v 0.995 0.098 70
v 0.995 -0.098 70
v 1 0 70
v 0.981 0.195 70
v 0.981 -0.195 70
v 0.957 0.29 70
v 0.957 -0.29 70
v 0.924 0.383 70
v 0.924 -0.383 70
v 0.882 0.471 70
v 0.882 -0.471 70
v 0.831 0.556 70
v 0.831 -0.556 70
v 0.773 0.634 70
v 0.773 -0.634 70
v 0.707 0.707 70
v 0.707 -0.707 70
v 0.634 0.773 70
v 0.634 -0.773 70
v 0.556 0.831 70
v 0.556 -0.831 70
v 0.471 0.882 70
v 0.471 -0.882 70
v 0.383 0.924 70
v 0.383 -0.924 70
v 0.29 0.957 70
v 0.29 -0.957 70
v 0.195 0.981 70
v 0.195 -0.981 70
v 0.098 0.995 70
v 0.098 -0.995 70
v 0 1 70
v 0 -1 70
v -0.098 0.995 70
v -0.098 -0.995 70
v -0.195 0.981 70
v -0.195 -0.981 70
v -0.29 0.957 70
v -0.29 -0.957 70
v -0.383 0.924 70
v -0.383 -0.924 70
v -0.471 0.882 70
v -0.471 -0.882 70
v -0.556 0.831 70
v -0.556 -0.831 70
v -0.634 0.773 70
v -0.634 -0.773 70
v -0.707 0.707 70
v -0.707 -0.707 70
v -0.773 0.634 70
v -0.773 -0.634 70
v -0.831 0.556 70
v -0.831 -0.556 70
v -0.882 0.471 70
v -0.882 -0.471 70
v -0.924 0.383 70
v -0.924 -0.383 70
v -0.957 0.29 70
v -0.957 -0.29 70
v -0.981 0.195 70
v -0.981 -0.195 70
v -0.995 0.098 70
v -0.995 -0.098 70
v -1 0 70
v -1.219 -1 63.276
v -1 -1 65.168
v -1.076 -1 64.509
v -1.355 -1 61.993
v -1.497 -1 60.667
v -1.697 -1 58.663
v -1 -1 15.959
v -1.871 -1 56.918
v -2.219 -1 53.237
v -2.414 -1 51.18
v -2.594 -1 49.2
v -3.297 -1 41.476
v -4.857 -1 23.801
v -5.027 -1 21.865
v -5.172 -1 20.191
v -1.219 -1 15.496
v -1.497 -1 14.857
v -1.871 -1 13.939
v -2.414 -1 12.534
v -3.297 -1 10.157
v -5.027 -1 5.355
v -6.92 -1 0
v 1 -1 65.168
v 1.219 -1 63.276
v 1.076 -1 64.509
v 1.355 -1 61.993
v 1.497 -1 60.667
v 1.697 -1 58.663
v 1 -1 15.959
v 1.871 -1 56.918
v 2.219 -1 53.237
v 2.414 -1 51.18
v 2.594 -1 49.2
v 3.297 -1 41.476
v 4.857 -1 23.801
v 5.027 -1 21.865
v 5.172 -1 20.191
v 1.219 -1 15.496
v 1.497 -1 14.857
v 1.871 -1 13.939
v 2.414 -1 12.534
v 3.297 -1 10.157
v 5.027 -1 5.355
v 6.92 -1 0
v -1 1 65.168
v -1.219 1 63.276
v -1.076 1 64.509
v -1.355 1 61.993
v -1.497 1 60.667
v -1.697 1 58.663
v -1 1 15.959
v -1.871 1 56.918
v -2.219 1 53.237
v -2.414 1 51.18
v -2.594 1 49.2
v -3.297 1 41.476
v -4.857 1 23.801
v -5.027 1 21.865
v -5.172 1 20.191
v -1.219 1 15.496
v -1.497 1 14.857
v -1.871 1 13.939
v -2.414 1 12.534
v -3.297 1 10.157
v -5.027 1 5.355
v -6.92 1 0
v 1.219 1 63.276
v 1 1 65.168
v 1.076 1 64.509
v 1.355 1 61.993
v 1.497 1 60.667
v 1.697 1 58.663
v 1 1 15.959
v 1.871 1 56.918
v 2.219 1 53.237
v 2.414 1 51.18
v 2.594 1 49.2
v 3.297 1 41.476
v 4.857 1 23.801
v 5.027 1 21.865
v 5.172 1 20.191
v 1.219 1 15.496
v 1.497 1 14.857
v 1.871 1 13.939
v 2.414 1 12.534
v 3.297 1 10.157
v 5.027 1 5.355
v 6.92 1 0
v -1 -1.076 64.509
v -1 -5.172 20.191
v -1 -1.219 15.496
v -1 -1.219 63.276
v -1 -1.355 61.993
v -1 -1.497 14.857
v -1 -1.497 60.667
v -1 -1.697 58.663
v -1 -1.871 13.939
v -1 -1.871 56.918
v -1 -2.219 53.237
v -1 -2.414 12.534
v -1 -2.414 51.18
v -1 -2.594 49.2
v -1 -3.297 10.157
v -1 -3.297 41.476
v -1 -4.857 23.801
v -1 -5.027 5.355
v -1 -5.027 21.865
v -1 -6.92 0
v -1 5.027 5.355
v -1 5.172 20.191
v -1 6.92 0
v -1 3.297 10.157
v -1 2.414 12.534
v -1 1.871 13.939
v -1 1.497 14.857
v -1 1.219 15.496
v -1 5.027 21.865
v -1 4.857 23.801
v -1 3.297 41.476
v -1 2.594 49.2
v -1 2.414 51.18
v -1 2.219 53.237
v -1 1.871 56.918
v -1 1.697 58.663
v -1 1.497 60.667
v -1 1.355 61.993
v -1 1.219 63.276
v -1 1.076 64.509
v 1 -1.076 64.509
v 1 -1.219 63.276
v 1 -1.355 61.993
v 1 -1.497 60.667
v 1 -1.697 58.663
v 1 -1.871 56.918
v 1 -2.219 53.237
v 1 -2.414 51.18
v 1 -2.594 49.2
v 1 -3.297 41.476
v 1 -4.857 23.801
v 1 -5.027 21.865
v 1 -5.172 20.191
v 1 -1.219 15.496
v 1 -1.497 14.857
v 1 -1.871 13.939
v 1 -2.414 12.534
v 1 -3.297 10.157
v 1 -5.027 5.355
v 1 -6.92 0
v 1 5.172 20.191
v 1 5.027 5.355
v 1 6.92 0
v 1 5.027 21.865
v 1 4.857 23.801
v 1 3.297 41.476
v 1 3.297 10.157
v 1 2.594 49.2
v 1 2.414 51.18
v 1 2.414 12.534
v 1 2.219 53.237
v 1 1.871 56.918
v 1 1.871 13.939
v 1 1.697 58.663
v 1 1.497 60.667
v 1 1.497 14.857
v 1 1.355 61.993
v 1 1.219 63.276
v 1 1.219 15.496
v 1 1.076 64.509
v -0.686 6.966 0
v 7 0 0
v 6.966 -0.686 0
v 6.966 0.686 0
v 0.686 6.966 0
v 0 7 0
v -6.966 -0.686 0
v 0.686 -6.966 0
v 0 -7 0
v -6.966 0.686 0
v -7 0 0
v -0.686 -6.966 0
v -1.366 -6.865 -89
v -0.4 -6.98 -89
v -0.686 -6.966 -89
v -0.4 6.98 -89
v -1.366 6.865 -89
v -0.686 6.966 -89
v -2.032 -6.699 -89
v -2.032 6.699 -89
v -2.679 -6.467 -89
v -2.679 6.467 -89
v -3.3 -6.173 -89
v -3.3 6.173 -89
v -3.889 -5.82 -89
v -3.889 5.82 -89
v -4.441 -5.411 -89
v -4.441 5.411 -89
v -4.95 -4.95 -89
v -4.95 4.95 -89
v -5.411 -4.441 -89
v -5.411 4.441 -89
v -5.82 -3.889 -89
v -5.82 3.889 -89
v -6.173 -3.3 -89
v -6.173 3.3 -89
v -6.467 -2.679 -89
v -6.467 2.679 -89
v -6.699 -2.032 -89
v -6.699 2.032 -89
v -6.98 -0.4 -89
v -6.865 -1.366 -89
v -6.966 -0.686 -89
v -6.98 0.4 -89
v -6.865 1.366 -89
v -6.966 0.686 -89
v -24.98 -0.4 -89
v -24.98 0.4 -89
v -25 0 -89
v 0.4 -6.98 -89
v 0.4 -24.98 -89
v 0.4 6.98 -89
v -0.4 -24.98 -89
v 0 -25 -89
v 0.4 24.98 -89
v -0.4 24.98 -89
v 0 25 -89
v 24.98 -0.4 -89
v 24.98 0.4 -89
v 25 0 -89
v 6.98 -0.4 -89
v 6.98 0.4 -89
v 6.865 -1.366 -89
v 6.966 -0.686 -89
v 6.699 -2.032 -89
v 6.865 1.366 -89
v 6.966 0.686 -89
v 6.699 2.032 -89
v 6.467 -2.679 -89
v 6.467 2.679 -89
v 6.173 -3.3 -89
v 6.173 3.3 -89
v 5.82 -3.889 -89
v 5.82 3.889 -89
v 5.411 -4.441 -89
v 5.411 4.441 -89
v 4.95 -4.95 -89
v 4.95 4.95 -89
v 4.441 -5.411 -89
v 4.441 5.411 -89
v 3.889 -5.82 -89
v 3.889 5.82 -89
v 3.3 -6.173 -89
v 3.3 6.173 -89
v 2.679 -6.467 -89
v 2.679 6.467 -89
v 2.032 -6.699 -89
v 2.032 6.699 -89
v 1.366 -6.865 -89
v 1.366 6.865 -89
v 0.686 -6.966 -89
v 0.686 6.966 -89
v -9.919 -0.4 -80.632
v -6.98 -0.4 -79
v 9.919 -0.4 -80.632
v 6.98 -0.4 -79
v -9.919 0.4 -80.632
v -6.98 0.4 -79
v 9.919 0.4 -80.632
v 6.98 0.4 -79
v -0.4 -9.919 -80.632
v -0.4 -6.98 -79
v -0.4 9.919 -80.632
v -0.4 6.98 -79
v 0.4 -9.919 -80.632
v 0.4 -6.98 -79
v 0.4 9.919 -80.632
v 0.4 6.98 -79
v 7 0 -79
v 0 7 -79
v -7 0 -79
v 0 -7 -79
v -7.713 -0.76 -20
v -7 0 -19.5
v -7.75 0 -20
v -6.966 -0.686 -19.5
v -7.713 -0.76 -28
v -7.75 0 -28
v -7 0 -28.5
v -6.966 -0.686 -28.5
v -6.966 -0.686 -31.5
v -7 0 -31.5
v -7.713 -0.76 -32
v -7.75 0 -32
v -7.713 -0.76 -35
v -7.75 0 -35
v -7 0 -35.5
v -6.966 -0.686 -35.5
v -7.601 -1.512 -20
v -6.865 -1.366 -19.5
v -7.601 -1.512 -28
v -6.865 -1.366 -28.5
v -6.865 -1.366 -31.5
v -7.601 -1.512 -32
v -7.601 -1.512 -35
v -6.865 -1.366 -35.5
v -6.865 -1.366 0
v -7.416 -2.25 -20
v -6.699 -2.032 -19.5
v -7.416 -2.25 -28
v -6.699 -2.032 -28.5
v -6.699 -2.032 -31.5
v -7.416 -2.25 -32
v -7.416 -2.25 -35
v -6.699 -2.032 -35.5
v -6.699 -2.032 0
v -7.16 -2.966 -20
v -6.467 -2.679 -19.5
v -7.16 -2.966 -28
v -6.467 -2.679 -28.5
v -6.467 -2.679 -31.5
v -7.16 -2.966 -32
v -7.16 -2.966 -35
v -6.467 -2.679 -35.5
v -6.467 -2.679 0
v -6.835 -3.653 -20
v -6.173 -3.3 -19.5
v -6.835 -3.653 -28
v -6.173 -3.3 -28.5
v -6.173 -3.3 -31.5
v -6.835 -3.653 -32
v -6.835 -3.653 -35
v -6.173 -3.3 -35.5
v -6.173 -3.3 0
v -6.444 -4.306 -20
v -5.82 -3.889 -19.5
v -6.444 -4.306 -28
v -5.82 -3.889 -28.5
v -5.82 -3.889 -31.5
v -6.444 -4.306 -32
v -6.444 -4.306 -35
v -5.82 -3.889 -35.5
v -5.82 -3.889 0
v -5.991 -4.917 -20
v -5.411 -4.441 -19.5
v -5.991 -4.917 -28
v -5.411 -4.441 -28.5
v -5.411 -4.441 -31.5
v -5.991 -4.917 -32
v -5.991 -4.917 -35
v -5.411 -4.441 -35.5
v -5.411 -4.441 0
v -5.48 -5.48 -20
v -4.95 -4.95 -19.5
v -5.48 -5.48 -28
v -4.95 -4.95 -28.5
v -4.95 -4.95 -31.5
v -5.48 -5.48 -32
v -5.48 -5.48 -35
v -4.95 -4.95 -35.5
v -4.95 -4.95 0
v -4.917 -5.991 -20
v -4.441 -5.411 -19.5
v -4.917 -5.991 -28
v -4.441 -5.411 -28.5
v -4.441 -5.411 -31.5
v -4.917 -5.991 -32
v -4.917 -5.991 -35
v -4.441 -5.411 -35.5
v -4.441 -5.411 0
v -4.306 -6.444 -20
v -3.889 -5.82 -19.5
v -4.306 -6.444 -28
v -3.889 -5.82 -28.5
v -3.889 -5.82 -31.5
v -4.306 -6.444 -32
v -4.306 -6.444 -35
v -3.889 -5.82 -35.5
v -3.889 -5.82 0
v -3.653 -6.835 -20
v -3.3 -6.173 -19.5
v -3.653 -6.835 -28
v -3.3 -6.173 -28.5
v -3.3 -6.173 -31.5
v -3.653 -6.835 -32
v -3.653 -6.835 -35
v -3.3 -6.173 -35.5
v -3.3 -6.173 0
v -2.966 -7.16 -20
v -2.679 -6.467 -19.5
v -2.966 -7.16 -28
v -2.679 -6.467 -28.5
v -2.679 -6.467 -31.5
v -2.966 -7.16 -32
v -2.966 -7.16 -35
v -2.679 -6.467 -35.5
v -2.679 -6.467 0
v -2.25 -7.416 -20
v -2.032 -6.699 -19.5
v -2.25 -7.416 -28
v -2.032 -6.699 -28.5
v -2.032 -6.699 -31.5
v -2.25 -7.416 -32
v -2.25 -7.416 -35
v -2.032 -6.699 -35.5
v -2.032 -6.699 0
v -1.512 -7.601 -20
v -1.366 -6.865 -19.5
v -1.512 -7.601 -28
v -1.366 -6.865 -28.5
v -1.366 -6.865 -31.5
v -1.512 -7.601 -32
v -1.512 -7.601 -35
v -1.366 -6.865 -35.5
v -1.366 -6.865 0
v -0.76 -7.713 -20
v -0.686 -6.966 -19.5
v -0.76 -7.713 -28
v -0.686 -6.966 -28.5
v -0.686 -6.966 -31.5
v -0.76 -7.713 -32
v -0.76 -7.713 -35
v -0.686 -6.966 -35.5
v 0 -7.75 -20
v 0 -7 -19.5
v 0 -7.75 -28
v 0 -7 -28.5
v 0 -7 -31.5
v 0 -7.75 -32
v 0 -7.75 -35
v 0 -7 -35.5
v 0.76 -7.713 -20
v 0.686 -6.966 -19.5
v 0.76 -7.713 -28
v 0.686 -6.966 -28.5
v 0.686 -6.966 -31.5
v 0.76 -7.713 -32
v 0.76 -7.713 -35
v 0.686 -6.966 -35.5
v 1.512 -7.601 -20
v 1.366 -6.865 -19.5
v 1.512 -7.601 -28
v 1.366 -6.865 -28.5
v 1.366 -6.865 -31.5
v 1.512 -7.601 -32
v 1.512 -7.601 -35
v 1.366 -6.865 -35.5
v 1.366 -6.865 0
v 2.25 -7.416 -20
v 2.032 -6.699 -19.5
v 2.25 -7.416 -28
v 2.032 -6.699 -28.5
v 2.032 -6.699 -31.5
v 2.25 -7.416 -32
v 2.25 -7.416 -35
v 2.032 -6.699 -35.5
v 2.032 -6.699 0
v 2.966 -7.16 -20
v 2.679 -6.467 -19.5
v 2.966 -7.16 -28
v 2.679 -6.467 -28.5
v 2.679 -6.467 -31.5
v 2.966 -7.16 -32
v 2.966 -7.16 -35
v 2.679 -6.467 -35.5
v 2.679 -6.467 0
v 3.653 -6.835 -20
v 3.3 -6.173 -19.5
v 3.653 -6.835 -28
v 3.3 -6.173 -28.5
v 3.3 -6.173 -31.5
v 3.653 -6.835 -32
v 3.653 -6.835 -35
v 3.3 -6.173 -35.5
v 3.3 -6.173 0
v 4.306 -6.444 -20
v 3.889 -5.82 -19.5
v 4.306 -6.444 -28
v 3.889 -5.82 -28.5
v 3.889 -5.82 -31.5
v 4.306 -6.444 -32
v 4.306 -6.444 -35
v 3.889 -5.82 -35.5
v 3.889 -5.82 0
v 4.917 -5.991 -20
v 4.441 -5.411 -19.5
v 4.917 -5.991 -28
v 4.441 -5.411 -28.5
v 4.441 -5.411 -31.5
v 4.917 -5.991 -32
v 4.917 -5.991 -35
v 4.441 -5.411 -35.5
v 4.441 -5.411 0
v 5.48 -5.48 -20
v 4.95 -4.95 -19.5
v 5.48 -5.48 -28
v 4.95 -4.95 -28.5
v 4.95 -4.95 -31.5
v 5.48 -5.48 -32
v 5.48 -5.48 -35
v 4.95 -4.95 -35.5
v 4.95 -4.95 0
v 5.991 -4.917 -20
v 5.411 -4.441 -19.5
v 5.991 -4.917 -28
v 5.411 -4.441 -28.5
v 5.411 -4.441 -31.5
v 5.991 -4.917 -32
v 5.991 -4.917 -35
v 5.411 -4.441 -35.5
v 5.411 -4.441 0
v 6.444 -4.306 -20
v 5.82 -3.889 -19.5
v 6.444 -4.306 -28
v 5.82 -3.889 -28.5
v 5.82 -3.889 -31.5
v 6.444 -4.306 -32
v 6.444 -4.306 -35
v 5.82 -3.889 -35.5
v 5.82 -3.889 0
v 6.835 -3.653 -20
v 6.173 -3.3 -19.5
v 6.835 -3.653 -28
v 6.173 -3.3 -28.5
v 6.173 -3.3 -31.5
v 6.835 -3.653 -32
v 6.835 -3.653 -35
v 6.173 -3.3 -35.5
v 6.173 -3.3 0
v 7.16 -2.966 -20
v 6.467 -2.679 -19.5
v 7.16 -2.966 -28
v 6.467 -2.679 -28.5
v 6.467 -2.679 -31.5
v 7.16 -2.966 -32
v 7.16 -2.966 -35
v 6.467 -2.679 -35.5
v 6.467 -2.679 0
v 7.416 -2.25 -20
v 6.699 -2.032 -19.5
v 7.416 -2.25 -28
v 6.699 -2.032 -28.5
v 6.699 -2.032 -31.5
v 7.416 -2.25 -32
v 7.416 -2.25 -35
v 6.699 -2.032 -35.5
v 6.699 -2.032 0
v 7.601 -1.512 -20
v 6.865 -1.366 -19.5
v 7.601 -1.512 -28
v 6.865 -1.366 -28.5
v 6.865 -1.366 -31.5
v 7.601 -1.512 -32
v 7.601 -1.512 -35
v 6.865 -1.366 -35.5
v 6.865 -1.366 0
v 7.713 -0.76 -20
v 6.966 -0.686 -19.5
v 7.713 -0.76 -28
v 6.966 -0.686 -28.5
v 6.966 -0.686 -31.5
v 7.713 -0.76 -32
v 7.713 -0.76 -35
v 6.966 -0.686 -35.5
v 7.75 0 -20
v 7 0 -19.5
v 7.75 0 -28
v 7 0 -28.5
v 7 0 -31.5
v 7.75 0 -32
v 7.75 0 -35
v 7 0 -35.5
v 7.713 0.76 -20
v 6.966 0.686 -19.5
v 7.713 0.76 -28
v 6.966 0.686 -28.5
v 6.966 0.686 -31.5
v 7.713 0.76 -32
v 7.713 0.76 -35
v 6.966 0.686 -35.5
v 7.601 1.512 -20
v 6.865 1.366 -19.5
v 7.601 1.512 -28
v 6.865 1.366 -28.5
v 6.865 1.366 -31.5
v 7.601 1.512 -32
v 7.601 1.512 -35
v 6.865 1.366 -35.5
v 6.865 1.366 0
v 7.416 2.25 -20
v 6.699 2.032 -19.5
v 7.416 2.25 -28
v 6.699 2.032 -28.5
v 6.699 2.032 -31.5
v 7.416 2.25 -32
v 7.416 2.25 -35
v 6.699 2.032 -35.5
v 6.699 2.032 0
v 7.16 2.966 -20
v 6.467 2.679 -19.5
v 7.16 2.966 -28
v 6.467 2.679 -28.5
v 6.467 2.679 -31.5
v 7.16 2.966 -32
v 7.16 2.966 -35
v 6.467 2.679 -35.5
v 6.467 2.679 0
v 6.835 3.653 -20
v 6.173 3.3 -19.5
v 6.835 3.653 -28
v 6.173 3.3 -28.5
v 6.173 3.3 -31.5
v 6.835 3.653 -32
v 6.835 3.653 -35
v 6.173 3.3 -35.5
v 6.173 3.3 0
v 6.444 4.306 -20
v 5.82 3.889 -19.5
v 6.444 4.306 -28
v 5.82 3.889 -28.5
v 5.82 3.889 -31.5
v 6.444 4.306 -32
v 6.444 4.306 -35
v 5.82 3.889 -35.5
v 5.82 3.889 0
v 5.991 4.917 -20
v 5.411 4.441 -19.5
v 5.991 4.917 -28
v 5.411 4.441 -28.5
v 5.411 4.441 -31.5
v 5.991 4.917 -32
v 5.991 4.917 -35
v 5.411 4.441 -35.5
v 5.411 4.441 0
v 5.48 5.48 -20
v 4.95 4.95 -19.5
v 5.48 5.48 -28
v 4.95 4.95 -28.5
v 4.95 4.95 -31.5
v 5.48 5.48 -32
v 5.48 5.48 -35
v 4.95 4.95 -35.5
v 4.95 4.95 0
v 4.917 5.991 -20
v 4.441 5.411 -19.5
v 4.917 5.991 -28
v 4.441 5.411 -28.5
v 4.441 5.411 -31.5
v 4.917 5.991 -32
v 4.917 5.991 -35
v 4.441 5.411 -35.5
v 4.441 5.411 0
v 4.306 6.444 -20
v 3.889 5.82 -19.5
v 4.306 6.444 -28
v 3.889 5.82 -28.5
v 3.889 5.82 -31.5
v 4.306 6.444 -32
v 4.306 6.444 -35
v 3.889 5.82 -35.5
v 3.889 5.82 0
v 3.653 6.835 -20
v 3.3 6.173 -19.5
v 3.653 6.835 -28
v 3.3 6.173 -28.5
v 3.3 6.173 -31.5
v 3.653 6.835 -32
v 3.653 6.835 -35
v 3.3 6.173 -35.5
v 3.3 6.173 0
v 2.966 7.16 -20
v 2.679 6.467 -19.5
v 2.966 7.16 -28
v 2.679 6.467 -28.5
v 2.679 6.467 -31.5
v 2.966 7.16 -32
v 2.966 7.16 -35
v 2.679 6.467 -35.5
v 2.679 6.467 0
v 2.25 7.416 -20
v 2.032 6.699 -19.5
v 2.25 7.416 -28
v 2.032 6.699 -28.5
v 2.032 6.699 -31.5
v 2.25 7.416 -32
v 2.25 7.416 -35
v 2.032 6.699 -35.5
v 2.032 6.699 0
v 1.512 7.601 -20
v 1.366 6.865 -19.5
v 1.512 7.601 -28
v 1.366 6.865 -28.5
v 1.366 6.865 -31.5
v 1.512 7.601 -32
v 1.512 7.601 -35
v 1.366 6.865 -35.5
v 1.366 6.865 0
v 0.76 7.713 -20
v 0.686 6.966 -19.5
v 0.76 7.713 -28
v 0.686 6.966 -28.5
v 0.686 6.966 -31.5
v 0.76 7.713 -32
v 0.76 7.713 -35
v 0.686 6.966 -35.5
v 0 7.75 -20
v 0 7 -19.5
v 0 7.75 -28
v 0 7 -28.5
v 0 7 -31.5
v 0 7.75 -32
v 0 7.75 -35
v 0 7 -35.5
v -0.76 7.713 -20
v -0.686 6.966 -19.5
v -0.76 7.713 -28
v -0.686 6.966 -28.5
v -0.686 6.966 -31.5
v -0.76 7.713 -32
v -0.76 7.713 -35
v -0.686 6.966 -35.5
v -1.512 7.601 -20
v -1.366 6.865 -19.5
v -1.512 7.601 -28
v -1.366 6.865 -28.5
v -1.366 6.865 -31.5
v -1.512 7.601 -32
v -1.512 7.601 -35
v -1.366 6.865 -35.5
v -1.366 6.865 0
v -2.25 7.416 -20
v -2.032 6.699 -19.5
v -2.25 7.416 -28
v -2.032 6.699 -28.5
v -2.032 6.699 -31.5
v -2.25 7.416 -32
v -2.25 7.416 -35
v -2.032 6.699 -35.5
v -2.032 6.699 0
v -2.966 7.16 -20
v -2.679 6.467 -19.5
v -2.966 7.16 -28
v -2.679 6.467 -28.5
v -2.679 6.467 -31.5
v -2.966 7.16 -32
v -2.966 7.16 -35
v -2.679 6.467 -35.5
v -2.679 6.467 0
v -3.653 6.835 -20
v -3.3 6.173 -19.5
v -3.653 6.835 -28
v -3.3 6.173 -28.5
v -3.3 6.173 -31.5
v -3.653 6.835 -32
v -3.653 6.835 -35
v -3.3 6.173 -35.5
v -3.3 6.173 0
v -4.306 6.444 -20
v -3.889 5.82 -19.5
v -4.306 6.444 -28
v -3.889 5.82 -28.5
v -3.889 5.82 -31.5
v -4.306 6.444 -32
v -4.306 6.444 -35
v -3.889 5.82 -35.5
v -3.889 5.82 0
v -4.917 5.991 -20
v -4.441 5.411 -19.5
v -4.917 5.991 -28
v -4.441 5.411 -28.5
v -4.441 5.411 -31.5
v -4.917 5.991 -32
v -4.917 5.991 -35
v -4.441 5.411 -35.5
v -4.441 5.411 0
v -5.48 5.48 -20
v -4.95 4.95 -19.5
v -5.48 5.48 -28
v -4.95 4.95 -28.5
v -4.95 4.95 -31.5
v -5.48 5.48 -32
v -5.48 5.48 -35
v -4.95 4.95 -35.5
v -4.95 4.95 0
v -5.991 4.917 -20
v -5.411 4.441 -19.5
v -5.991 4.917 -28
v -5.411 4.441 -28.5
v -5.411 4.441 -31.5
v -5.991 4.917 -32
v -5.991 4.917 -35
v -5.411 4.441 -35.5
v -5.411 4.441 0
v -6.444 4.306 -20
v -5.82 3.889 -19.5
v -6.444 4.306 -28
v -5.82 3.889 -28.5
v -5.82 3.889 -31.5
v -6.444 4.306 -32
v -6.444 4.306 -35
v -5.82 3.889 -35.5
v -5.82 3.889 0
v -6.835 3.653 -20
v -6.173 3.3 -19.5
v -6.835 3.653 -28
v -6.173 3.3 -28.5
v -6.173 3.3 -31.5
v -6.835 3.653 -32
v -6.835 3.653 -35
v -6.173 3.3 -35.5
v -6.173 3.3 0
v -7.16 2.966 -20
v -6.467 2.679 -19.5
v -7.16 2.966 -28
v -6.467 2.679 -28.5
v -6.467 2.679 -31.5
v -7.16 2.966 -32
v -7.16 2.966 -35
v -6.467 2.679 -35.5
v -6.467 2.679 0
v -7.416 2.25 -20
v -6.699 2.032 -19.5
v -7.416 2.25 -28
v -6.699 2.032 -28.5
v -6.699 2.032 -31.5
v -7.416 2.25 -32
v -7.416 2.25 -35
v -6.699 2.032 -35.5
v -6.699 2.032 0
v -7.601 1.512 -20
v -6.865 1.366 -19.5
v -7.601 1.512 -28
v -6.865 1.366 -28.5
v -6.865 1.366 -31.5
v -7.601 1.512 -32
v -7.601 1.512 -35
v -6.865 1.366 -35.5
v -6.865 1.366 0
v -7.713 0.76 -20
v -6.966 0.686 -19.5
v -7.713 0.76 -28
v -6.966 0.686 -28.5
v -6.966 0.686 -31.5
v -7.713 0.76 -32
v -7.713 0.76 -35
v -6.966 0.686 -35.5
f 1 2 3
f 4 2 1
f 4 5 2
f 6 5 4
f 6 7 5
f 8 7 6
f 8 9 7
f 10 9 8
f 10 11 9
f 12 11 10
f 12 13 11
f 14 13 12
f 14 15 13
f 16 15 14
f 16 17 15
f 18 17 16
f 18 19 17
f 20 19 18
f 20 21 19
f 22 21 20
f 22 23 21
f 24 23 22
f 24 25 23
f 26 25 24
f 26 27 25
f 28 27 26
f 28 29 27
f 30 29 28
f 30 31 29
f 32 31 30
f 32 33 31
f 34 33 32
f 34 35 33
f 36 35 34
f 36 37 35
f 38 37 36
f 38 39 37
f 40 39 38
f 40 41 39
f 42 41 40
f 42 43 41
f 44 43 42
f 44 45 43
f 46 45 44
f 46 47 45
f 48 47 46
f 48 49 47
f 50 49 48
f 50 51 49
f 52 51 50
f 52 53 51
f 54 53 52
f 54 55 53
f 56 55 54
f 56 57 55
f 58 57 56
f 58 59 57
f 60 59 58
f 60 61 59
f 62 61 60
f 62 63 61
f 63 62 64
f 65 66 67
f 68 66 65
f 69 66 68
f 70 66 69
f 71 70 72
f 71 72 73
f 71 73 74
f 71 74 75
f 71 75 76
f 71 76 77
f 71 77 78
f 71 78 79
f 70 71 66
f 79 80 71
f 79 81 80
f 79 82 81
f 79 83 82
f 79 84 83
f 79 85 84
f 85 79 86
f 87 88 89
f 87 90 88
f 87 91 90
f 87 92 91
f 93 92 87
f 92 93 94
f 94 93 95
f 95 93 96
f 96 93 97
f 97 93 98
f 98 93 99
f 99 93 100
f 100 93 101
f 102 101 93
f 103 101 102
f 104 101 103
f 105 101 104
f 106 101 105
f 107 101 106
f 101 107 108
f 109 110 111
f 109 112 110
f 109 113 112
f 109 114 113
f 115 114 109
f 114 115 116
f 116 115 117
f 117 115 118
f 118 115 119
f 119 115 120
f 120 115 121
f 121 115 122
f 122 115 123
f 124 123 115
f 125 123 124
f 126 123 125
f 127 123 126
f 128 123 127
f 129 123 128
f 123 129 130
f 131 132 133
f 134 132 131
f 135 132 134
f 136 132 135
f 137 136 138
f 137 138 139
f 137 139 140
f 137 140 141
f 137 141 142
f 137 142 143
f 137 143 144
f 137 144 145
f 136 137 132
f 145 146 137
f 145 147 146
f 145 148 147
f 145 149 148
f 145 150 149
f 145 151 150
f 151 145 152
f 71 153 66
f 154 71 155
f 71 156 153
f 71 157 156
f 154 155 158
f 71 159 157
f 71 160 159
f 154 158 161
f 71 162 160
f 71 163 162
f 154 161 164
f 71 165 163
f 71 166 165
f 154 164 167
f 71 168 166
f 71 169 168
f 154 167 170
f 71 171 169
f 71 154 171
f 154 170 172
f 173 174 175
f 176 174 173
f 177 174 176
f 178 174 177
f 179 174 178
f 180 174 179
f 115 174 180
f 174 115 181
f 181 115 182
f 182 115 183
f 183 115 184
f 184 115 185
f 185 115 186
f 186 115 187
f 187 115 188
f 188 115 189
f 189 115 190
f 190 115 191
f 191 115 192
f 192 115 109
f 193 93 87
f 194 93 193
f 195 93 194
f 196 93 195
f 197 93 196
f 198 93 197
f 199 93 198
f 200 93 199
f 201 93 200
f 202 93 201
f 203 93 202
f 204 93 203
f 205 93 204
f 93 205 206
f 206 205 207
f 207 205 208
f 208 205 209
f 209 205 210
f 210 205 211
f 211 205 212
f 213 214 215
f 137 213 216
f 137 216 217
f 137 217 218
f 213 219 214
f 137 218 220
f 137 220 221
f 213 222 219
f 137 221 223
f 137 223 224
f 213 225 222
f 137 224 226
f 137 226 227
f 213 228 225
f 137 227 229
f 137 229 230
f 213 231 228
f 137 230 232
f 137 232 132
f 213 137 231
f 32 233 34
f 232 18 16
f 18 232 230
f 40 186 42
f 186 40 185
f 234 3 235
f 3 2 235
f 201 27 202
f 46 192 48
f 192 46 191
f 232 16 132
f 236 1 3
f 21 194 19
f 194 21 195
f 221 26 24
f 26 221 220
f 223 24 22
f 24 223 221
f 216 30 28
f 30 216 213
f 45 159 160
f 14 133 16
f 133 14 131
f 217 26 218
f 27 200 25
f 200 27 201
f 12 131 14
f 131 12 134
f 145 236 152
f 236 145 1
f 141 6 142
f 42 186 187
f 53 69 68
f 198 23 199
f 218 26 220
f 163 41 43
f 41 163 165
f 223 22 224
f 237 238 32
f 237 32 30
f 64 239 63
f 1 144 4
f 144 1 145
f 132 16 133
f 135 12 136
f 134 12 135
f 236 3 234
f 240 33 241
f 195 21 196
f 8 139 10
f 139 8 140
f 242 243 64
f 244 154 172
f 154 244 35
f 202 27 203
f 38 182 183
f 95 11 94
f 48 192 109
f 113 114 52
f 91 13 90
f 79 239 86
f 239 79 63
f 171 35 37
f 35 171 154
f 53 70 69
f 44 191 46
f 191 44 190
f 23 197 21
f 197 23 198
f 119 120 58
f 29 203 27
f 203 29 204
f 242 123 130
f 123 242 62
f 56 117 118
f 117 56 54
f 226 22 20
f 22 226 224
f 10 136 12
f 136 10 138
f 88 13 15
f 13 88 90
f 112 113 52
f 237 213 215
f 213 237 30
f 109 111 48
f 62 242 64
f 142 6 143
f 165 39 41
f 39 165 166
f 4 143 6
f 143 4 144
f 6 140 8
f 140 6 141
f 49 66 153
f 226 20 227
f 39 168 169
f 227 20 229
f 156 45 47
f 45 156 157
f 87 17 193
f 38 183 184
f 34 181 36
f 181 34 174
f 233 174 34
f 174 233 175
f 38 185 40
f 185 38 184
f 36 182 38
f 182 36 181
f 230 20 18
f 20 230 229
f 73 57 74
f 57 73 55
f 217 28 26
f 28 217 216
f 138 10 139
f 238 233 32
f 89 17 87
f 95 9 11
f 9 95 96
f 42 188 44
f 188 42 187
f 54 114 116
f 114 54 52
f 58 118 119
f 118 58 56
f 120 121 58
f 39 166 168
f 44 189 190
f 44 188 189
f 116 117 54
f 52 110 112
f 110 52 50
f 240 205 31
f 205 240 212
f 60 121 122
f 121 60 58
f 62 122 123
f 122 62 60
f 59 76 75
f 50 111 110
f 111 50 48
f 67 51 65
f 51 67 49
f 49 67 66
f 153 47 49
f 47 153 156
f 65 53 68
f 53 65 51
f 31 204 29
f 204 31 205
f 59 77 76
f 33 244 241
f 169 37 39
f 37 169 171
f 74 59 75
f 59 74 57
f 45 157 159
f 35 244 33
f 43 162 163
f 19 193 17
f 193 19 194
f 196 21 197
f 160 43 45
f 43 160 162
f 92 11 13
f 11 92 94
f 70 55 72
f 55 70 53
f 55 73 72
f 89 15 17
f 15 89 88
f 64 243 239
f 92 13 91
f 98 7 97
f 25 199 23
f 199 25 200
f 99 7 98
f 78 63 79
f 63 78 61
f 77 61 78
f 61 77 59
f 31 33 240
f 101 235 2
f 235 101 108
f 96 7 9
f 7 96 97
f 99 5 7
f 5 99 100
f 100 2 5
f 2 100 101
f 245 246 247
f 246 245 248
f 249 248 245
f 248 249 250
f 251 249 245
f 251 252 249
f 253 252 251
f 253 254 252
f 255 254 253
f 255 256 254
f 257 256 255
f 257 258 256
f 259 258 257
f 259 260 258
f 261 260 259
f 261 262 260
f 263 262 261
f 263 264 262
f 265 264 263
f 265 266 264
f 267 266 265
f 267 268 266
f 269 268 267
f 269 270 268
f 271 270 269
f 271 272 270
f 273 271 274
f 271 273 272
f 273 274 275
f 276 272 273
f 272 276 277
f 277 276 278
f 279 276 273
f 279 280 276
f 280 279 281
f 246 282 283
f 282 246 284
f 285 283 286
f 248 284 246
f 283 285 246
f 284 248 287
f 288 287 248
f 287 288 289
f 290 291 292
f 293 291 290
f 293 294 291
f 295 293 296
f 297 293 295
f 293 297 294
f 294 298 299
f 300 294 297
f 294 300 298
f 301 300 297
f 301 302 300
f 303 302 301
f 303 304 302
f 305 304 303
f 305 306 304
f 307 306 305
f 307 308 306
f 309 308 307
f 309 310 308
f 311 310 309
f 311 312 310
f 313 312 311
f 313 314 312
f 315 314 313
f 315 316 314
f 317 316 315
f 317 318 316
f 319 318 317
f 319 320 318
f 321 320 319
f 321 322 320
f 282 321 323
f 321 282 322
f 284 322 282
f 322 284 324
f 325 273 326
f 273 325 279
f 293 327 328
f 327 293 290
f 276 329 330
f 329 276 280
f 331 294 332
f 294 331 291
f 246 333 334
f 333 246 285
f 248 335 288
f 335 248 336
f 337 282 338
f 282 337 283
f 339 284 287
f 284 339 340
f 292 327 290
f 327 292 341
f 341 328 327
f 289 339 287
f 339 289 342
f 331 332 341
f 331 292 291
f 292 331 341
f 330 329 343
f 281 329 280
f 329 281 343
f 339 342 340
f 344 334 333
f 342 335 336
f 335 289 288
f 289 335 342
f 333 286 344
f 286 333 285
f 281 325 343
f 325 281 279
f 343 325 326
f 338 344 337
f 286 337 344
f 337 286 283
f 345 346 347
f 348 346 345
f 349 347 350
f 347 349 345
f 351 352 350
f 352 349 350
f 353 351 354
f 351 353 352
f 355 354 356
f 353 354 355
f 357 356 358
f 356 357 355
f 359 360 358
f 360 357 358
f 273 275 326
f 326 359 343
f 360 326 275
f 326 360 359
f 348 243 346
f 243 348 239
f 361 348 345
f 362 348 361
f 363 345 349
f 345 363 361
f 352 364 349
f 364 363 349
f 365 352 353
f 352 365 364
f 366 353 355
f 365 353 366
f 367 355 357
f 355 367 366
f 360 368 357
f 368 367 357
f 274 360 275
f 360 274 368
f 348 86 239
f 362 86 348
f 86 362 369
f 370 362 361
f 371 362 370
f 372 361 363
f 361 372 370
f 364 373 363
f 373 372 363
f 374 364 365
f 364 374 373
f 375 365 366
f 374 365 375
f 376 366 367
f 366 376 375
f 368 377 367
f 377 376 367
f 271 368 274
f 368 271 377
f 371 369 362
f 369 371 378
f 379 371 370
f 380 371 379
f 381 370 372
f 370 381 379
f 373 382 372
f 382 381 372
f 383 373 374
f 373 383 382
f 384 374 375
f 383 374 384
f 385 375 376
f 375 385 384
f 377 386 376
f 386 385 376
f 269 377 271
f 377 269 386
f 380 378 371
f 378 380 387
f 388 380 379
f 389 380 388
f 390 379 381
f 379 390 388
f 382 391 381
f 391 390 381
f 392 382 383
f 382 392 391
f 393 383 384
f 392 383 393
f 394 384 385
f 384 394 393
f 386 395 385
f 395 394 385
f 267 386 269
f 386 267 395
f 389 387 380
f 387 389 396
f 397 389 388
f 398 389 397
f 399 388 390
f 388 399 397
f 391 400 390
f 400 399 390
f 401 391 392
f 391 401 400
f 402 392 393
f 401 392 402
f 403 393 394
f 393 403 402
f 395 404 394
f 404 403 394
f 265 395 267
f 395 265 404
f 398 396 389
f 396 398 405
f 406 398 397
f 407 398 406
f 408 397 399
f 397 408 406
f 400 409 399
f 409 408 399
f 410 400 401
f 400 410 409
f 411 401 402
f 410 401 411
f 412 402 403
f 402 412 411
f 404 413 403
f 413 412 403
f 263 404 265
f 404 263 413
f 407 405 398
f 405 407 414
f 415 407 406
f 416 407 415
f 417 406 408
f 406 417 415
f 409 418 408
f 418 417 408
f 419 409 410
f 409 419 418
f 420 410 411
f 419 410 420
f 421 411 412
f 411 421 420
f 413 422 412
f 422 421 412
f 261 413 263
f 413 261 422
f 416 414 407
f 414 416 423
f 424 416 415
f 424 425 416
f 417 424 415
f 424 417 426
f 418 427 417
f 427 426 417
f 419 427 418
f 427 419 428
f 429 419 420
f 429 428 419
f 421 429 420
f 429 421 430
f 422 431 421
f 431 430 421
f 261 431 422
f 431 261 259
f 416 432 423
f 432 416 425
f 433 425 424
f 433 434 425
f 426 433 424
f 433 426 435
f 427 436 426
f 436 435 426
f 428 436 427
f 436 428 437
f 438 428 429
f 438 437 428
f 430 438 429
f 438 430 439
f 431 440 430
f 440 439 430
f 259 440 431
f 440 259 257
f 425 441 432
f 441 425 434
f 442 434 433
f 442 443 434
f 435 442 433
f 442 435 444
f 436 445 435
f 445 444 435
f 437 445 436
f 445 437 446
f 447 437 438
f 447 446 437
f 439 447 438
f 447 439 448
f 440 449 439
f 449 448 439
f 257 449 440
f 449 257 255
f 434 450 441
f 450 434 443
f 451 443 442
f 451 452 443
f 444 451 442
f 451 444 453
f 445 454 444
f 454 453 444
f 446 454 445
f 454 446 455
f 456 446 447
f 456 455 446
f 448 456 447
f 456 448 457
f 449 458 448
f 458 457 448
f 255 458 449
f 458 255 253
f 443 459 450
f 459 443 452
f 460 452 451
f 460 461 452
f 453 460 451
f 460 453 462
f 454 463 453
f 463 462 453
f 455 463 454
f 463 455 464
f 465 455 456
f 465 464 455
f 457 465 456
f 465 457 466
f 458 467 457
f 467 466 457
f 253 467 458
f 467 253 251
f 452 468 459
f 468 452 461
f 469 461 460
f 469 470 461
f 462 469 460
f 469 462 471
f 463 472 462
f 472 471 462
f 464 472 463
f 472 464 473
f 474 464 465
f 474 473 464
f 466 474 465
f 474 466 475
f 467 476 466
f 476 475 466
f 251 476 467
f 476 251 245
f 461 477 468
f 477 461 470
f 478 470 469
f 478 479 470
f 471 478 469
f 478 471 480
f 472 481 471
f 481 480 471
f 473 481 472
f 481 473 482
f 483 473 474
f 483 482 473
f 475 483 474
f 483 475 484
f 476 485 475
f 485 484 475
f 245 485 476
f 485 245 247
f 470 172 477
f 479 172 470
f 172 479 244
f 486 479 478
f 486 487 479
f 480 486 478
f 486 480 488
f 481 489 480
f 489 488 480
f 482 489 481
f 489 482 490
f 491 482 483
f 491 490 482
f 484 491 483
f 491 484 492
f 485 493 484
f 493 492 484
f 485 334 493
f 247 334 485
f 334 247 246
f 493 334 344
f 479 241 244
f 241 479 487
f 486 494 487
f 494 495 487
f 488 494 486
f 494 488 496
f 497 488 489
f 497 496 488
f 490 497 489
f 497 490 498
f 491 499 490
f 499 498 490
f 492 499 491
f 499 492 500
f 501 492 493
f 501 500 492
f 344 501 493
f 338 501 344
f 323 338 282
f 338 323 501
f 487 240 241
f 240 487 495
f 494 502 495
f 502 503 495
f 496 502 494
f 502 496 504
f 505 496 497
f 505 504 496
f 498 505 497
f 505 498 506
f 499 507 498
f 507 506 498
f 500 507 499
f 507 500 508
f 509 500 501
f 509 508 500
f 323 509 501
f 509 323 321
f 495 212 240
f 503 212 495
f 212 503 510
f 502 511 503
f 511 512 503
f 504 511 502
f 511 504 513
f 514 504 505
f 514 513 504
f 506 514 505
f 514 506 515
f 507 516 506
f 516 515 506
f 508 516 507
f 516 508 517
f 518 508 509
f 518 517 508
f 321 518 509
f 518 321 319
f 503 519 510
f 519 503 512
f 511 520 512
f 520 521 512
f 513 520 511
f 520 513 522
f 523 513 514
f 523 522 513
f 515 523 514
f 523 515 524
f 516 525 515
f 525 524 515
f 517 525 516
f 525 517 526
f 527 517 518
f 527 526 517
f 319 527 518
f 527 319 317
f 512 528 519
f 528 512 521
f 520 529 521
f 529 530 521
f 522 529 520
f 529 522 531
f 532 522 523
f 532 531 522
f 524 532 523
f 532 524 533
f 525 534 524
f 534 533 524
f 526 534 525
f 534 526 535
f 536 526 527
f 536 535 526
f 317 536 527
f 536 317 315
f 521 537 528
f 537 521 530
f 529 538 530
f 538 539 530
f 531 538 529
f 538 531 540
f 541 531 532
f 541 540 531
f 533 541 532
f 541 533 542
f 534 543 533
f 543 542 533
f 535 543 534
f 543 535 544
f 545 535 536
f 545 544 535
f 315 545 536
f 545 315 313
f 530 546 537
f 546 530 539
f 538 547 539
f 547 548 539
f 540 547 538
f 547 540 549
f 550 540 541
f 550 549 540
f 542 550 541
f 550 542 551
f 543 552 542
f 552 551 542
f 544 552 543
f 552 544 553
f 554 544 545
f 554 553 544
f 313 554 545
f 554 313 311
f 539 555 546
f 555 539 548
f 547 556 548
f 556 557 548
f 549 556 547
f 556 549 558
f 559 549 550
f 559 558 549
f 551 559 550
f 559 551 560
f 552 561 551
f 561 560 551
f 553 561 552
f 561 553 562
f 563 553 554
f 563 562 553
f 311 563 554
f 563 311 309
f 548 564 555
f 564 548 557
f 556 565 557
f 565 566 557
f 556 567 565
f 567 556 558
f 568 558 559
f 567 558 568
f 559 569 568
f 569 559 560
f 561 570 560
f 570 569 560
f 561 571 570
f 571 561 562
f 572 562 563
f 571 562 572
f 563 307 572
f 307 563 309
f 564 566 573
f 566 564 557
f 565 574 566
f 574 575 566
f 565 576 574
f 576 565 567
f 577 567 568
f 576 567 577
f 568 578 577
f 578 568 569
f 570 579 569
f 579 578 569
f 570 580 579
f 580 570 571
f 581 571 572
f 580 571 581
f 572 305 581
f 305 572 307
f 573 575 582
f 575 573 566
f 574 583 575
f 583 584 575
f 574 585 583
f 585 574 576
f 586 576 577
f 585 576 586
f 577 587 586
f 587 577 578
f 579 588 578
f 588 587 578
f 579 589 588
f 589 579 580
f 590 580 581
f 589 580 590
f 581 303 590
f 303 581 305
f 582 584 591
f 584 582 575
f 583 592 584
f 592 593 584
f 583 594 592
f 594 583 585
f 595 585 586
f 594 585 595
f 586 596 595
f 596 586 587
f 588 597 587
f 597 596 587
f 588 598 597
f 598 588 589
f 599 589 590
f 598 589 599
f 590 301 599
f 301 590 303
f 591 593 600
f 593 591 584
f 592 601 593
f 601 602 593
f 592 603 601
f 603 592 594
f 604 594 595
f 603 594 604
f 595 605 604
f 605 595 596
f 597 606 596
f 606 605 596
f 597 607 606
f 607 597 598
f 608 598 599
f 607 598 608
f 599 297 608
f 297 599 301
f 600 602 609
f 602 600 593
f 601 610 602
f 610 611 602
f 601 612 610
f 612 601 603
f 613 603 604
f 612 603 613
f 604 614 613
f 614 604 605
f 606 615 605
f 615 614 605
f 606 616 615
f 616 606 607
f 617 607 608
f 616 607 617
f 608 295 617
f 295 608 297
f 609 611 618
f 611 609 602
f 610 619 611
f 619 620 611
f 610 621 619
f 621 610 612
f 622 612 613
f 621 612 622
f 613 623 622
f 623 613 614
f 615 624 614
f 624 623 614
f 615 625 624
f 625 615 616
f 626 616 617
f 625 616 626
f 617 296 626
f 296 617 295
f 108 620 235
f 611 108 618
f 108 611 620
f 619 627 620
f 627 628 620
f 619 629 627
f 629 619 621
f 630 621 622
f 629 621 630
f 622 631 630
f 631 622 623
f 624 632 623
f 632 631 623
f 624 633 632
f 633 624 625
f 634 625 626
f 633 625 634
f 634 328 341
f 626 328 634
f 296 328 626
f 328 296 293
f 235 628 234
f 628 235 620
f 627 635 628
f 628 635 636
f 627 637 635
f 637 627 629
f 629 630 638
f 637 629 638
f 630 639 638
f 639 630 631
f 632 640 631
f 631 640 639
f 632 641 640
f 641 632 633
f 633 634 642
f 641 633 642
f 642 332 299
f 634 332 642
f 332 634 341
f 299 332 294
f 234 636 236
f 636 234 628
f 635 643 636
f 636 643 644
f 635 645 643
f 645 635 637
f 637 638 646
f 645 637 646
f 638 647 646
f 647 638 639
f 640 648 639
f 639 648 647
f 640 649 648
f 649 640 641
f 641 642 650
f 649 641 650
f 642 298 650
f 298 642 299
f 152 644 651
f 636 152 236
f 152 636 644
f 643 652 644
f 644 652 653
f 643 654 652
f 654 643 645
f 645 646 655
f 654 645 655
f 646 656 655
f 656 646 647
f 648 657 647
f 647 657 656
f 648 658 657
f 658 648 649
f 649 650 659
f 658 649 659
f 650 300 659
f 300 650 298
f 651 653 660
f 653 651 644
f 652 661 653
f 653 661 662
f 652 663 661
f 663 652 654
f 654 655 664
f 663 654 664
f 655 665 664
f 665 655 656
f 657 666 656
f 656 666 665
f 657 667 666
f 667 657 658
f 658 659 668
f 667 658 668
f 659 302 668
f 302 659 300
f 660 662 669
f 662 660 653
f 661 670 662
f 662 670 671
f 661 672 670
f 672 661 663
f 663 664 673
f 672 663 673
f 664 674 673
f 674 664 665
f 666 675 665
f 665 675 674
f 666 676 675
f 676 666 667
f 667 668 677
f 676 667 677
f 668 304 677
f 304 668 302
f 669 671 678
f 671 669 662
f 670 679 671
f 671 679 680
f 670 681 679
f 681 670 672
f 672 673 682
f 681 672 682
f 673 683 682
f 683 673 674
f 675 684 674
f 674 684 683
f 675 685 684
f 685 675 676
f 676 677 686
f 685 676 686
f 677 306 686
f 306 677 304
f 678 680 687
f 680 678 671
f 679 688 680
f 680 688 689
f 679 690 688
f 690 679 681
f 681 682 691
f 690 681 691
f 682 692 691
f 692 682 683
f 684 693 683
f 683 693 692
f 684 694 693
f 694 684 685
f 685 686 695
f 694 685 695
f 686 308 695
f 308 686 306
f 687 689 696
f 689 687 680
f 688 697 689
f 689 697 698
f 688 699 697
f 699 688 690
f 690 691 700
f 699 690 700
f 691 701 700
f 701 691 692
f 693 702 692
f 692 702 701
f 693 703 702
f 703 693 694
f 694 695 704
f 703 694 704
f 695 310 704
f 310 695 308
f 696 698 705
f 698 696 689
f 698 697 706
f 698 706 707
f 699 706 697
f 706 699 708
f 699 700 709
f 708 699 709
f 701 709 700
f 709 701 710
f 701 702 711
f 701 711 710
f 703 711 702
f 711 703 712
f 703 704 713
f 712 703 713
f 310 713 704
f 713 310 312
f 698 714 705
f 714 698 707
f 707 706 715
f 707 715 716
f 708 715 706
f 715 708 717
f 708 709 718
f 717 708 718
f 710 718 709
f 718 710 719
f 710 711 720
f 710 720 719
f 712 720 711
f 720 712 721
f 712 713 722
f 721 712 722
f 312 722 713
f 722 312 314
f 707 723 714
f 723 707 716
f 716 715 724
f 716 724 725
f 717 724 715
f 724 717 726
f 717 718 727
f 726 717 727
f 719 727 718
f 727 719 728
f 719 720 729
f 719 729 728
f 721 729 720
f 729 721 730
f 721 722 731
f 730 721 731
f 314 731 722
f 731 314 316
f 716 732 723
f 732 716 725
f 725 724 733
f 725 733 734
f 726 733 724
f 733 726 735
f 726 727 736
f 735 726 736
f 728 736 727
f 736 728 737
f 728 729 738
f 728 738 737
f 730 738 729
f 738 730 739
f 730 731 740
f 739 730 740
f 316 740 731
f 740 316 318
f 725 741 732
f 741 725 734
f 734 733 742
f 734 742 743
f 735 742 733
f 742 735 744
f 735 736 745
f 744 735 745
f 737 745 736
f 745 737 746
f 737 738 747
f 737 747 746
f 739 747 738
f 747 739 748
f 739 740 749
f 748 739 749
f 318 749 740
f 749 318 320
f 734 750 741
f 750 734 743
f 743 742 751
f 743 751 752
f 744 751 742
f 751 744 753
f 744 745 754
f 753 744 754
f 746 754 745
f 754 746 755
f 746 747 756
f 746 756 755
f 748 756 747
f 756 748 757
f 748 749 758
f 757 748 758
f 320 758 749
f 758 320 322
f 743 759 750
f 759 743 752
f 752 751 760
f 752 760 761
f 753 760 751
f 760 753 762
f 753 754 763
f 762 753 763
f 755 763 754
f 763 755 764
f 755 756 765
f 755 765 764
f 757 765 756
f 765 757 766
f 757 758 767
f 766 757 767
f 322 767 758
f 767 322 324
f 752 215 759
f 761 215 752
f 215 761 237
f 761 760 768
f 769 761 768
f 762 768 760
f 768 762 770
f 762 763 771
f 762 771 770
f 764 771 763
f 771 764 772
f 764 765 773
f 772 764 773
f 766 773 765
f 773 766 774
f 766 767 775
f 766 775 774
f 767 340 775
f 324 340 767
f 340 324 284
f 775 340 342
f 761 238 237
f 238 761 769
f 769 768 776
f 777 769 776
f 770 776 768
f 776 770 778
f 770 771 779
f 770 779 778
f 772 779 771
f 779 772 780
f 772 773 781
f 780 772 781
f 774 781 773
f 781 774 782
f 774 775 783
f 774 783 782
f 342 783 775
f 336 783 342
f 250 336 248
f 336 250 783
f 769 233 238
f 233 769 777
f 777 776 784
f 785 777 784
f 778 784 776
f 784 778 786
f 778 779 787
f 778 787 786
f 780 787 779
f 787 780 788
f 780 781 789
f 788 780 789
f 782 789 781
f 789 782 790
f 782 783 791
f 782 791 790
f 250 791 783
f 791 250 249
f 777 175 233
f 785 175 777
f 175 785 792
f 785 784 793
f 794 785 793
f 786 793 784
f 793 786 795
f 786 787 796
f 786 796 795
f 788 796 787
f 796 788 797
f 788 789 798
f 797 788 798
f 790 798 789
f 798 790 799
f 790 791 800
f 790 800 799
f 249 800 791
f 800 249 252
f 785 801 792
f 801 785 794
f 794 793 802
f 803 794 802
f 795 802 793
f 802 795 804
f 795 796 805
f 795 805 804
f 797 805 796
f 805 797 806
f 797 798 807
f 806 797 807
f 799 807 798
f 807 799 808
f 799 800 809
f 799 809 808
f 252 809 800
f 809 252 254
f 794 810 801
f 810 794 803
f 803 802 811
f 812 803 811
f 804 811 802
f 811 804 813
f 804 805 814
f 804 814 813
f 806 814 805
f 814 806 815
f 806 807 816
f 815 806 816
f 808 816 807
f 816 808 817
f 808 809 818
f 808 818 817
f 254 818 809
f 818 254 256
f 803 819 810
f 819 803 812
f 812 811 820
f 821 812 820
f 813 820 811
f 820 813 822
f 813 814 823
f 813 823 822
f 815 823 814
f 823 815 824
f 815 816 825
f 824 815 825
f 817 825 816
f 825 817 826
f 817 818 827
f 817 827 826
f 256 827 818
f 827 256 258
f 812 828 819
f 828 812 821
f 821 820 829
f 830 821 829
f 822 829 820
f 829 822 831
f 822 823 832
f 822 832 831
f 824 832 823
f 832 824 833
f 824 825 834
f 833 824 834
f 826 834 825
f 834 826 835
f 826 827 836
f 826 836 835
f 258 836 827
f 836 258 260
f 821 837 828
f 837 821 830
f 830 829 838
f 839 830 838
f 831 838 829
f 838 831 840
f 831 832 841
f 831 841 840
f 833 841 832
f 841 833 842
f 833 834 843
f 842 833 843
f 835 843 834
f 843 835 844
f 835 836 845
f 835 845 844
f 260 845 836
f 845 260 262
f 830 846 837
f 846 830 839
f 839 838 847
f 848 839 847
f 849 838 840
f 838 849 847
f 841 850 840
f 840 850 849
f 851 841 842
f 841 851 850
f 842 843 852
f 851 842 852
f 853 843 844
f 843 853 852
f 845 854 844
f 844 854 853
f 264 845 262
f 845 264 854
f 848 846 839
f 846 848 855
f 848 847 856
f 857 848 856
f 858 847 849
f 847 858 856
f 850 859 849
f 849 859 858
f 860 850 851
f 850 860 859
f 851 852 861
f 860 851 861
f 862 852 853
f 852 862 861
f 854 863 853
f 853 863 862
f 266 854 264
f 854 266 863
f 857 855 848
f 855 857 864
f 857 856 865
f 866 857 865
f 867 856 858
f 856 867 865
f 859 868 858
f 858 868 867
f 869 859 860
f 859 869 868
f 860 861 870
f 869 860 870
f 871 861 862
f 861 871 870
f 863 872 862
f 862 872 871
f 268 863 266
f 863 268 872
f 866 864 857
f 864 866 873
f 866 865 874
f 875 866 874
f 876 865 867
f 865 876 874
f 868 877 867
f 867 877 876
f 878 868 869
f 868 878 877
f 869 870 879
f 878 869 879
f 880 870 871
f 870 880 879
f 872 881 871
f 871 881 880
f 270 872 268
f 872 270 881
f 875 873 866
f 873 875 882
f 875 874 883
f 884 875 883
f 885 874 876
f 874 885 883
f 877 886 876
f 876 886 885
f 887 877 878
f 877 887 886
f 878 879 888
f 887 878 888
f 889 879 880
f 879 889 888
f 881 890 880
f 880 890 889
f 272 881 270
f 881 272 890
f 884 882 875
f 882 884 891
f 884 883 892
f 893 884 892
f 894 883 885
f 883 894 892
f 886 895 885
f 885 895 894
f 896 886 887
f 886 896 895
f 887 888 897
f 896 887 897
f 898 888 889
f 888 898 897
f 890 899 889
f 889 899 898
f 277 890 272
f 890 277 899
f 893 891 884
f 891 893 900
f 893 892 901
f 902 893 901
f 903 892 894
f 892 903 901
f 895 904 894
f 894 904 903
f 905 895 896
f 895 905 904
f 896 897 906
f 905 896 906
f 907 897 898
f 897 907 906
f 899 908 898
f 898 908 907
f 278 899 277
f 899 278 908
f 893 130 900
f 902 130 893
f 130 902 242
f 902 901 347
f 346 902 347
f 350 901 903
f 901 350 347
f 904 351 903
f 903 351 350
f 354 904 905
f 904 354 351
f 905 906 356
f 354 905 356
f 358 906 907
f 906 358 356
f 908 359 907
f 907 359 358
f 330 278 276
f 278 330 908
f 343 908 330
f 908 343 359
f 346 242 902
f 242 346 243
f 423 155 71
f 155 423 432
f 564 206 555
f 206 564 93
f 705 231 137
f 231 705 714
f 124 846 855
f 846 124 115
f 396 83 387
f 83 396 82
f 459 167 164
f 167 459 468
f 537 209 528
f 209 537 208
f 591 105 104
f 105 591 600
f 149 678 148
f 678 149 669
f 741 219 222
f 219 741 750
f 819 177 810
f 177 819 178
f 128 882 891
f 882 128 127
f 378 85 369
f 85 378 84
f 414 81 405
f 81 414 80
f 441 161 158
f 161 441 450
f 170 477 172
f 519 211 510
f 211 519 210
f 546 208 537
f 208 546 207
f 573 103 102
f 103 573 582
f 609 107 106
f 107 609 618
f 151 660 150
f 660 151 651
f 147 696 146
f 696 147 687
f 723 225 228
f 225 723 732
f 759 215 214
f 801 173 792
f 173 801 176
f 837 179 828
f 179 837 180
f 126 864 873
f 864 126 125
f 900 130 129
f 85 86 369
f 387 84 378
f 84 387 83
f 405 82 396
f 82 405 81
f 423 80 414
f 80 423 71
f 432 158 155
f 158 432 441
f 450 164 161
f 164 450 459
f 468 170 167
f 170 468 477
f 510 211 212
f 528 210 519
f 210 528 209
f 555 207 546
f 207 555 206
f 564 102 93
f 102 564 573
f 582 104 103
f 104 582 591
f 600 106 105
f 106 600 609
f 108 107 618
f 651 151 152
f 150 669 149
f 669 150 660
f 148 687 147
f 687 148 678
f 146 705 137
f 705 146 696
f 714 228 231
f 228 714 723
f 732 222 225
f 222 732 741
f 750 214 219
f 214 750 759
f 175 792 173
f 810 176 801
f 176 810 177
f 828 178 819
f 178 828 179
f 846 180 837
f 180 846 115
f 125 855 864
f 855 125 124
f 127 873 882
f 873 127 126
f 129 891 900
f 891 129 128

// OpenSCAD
/*

  sonnenschirm_halterung.scad

  (c) olikraus@gmail.com

  This work is licensed under the Creative Commons Attribution-NonCommercial-ShareAlike 4.0 International License. 
  To view a copy of this license, visit http://creativecommons.org/licenses/by-nc-sa/4.0/.

*/

$fn=64;

inner_dia = 14;
outer_dia = 15.5;
chamfer = 0.5;
//h1 = 55;
h1 = 54;
h2 = 3;
h3 = 4;
h4 = 8;
h5 = 20;

h6 = 20;
h7 = 50;
wall = 2;

points = [
  [0, h1+h2+h3+h4+h5],
  [(inner_dia)/2, h1+h2+h3+h4+h5],
  [(inner_dia)/2, h2+h3+h4+h5+chamfer],
  [(outer_dia)/2, h2+h3+h4+h5],
  [(outer_dia)/2, h3+h4+h5],
  [(inner_dia)/2, h3+h4+h5-chamfer],
  [(inner_dia)/2, h4+h5+chamfer],
  [(outer_dia)/2, h4+h5],
  [(outer_dia)/2, h5],
  [(inner_dia)/2, h5-chamfer],
  [(inner_dia)/2, 0],
  [0, 0] 
];


rotate([180,0,0])
union() {
  rotate_extrude()  
  polygon(points);  

  translate([0,0,-(h6+h7)/2])
  intersection() {
    union() {
      cube([inner_dia, wall, h6+h7], center=true);
      rotate([0,0,90])
      cube([inner_dia, wall, h6+h7], center=true);
    }
    cylinder(d2=inner_dia, d1=wall, h=h6+h7, center=true);
  }

  translate([0,0,-h6])
  cylinder(d2=inner_dia, d1=0, h=h6);
  
  
  translate([0,0,h1+h2+h3+h4+h5-10/2])
  intersection() {
    union() {
      cube([50, 0.8, 10], center=true);
      rotate([0,0,90])
      cube([50, 0.8, 10], center=true);  
    }
    cylinder(d2=50, d1=inner_dia, h=10, center=true);
  }
}
